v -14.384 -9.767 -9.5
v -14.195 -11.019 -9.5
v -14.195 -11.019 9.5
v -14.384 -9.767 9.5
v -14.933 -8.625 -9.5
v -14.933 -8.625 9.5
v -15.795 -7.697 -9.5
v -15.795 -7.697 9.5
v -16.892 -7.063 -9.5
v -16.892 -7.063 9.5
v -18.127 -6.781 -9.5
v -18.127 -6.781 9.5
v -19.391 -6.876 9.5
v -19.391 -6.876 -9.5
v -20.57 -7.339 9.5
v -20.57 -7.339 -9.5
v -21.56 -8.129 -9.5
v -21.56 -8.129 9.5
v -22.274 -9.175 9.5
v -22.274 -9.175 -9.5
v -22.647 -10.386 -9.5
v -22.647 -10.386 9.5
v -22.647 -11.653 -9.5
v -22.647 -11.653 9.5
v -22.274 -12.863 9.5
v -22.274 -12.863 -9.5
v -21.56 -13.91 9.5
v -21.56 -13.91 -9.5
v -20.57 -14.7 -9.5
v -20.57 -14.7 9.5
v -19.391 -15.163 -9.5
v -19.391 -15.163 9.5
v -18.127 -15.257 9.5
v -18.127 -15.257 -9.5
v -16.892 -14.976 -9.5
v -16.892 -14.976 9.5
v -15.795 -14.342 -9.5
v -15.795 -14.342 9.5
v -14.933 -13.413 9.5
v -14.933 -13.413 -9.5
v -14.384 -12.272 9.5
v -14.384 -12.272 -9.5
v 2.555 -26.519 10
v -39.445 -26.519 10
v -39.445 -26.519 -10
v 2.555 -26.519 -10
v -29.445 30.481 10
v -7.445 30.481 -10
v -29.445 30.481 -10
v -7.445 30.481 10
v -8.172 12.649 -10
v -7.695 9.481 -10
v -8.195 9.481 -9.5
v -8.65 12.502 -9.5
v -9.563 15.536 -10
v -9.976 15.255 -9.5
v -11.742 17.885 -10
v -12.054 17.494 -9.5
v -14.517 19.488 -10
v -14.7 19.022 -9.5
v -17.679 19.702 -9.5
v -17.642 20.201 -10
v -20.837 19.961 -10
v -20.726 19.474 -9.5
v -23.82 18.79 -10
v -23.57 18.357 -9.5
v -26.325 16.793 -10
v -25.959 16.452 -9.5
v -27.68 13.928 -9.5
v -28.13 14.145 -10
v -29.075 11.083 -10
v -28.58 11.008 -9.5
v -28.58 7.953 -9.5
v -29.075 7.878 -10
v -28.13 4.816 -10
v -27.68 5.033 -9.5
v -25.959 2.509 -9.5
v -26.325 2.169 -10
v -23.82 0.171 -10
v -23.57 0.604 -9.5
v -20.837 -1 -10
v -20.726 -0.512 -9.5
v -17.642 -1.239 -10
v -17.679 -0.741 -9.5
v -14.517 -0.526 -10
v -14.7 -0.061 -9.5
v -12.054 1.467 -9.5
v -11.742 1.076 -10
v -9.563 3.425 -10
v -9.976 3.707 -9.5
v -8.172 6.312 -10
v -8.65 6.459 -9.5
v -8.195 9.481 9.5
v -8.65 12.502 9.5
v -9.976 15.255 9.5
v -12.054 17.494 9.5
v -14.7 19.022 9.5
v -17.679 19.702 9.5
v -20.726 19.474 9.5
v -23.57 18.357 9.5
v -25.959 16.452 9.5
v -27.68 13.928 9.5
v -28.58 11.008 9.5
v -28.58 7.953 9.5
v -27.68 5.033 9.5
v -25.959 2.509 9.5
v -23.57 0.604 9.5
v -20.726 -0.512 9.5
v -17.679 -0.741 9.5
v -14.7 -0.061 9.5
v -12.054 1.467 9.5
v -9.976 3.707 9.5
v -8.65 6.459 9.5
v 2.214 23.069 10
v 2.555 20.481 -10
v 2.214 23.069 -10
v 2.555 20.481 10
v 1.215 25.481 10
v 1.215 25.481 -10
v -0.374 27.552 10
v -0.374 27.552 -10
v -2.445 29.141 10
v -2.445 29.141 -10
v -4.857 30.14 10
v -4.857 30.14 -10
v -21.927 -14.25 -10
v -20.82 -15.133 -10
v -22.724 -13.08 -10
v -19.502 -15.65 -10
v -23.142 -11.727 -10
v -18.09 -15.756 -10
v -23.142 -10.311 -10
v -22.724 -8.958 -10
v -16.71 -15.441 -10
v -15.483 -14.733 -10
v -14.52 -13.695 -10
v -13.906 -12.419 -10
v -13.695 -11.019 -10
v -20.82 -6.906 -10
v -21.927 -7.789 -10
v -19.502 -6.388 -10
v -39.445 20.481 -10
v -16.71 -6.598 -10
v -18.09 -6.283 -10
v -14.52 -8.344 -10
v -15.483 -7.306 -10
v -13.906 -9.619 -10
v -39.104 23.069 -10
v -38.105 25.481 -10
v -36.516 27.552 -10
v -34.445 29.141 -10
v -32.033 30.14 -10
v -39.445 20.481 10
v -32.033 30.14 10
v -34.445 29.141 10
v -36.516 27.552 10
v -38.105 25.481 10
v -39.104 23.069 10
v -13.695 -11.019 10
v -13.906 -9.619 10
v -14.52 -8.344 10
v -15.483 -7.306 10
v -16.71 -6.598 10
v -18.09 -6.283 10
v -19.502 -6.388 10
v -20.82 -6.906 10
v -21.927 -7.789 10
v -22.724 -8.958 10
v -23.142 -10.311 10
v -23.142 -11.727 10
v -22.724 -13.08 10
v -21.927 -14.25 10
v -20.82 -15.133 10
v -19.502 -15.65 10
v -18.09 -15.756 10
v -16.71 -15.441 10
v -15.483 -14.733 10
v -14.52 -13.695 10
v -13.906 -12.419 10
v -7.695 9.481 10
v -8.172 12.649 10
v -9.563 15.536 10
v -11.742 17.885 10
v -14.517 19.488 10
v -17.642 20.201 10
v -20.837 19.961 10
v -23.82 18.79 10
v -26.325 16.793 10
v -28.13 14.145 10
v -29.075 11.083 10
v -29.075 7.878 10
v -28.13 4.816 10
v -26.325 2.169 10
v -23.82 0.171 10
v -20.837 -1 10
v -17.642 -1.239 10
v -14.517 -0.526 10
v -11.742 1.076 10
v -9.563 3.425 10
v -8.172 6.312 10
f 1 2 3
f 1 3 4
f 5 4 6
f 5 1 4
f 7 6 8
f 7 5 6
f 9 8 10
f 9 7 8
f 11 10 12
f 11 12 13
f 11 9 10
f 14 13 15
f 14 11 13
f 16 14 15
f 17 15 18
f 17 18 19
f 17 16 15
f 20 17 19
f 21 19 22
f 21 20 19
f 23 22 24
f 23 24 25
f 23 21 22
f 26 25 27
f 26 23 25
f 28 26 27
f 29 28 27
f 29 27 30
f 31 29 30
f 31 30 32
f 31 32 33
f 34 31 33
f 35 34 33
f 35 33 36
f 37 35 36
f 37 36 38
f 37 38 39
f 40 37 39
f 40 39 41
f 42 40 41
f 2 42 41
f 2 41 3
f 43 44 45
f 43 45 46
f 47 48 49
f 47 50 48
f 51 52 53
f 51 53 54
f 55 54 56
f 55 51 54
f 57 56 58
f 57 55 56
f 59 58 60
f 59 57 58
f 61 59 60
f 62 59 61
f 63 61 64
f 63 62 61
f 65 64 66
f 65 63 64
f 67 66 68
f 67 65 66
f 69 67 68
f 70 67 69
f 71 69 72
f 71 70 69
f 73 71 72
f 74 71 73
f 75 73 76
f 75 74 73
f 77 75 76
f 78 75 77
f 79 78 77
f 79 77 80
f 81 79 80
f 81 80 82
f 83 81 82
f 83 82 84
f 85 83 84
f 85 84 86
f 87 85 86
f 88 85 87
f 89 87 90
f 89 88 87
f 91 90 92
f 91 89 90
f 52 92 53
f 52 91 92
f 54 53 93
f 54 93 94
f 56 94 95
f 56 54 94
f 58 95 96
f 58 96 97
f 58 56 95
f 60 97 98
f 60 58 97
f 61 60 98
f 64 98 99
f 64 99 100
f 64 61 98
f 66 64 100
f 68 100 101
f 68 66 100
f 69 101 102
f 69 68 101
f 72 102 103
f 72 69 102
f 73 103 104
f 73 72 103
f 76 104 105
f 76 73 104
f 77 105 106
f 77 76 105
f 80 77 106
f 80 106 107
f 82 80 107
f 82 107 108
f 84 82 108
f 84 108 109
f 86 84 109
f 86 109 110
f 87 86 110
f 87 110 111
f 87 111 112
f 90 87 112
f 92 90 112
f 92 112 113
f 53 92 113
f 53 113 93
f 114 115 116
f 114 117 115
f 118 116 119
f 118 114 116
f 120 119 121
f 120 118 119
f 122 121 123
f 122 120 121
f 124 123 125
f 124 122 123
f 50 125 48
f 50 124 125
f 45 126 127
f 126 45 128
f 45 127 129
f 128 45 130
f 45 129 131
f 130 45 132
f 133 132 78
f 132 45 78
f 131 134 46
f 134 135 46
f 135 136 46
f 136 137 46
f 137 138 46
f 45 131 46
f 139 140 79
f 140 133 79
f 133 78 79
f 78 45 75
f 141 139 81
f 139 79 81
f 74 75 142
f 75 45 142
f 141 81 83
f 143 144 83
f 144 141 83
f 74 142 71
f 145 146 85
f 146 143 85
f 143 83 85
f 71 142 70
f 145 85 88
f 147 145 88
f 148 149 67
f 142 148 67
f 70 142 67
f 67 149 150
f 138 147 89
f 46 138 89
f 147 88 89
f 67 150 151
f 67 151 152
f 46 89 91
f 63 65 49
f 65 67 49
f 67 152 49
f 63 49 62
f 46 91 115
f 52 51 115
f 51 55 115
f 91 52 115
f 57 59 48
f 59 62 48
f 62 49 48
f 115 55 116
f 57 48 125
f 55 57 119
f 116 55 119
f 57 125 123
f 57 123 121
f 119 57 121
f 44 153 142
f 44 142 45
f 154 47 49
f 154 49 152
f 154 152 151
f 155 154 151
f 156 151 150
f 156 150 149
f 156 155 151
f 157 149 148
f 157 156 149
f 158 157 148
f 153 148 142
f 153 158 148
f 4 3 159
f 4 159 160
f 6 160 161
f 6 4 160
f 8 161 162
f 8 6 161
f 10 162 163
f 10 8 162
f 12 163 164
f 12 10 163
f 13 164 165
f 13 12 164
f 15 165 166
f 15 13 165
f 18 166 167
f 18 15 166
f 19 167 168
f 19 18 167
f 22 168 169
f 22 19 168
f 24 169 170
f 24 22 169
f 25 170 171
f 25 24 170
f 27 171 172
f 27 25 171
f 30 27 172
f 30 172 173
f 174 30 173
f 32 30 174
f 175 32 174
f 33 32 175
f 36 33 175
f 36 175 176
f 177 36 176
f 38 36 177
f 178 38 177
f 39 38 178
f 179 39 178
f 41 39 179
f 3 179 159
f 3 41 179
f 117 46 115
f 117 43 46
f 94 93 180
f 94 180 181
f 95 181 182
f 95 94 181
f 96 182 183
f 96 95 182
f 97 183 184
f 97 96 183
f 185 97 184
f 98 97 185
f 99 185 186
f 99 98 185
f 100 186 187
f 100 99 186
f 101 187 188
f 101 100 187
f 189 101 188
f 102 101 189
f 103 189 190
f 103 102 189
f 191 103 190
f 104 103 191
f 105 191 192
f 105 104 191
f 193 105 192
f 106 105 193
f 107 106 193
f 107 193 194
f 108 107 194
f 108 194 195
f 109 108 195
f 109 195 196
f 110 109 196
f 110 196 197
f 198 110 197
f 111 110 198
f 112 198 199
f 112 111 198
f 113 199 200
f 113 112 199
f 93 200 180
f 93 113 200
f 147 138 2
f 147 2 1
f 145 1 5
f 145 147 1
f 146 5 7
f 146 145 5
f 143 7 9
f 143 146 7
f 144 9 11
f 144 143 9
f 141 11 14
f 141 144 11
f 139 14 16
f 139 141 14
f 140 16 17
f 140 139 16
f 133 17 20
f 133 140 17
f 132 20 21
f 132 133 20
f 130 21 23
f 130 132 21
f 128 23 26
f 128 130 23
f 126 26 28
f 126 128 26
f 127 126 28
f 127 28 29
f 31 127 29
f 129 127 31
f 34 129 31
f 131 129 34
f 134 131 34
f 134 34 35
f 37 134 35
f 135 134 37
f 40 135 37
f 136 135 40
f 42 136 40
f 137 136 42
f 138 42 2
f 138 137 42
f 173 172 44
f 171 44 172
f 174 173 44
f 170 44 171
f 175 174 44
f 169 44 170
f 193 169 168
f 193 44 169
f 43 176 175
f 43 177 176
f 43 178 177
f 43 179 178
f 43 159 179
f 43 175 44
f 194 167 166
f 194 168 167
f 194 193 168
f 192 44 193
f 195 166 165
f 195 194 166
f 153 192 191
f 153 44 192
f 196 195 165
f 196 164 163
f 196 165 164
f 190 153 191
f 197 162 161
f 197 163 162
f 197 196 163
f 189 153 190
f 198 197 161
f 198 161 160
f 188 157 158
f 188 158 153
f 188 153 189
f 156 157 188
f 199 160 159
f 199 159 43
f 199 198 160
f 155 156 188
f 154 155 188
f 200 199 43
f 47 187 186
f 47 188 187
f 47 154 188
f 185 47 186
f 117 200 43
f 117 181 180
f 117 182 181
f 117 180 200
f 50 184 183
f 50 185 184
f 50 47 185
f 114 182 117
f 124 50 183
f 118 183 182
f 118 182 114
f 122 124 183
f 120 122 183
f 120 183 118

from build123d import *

# Parameters (mm, degrees)
SKETCH1_R           = 10.25
SKETCH1_R_2         = 4.25
BOSS_EXTRUDE1_DEPTH = 10
CHAMFER1_SIZE       = 0.5
CHAMFER2_SIZE       = 0.5


with BuildPart() as part:
    # Sketch1 → Boss-Extrude1 (new, symmetric)
    with BuildSketch(Plane.XY):
        with BuildLine():
            Line((-7.444896481, 30.480652594), (-29.444896481, 30.480652594))
            ThreePointArc((-29.444896481, 30.480652594), (-36.515964293, 27.551720406), (-39.444896481, 20.480652594))
            Line((-39.444896481, 20.480652594), (-39.444896481, -26.519347406))
            Line((-39.444896481, -26.519347406), (2.555103519, -26.519347406))
            Line((2.555103519, -26.519347406), (2.555103519, 20.480652594))
            ThreePointArc((2.555103519, 20.480652594), (-0.373828669, 27.551720406), (-7.444896481, 30.480652594))
        make_face()
        with Locations((-18.444896481, 9.480652594)):
            Circle(SKETCH1_R, mode=Mode.SUBTRACT)
        with Locations((-18.444896481, -11.019347406)):
            Circle(SKETCH1_R_2, mode=Mode.SUBTRACT)
    extrude(amount=BOSS_EXTRUDE1_DEPTH, both=True)

    # Chamfer1
    chamfer1_edges = [part.edges().sort_by_distance(p)[0] for p in [
        (-28.694896481, 9.480652594, -10),
        (-28.694896481, 9.480652594, 10),
    ]]
    chamfer(chamfer1_edges, length=CHAMFER1_SIZE)

    # Chamfer2
    chamfer2_edges = [part.edges().sort_by_distance(p)[0] for p in [
        (-22.694896481, -11.019347406, -10),
        (-22.694896481, -11.019347406, 10),
    ]]
    chamfer(chamfer2_edges, length=CHAMFER2_SIZE)


solid = part.part
